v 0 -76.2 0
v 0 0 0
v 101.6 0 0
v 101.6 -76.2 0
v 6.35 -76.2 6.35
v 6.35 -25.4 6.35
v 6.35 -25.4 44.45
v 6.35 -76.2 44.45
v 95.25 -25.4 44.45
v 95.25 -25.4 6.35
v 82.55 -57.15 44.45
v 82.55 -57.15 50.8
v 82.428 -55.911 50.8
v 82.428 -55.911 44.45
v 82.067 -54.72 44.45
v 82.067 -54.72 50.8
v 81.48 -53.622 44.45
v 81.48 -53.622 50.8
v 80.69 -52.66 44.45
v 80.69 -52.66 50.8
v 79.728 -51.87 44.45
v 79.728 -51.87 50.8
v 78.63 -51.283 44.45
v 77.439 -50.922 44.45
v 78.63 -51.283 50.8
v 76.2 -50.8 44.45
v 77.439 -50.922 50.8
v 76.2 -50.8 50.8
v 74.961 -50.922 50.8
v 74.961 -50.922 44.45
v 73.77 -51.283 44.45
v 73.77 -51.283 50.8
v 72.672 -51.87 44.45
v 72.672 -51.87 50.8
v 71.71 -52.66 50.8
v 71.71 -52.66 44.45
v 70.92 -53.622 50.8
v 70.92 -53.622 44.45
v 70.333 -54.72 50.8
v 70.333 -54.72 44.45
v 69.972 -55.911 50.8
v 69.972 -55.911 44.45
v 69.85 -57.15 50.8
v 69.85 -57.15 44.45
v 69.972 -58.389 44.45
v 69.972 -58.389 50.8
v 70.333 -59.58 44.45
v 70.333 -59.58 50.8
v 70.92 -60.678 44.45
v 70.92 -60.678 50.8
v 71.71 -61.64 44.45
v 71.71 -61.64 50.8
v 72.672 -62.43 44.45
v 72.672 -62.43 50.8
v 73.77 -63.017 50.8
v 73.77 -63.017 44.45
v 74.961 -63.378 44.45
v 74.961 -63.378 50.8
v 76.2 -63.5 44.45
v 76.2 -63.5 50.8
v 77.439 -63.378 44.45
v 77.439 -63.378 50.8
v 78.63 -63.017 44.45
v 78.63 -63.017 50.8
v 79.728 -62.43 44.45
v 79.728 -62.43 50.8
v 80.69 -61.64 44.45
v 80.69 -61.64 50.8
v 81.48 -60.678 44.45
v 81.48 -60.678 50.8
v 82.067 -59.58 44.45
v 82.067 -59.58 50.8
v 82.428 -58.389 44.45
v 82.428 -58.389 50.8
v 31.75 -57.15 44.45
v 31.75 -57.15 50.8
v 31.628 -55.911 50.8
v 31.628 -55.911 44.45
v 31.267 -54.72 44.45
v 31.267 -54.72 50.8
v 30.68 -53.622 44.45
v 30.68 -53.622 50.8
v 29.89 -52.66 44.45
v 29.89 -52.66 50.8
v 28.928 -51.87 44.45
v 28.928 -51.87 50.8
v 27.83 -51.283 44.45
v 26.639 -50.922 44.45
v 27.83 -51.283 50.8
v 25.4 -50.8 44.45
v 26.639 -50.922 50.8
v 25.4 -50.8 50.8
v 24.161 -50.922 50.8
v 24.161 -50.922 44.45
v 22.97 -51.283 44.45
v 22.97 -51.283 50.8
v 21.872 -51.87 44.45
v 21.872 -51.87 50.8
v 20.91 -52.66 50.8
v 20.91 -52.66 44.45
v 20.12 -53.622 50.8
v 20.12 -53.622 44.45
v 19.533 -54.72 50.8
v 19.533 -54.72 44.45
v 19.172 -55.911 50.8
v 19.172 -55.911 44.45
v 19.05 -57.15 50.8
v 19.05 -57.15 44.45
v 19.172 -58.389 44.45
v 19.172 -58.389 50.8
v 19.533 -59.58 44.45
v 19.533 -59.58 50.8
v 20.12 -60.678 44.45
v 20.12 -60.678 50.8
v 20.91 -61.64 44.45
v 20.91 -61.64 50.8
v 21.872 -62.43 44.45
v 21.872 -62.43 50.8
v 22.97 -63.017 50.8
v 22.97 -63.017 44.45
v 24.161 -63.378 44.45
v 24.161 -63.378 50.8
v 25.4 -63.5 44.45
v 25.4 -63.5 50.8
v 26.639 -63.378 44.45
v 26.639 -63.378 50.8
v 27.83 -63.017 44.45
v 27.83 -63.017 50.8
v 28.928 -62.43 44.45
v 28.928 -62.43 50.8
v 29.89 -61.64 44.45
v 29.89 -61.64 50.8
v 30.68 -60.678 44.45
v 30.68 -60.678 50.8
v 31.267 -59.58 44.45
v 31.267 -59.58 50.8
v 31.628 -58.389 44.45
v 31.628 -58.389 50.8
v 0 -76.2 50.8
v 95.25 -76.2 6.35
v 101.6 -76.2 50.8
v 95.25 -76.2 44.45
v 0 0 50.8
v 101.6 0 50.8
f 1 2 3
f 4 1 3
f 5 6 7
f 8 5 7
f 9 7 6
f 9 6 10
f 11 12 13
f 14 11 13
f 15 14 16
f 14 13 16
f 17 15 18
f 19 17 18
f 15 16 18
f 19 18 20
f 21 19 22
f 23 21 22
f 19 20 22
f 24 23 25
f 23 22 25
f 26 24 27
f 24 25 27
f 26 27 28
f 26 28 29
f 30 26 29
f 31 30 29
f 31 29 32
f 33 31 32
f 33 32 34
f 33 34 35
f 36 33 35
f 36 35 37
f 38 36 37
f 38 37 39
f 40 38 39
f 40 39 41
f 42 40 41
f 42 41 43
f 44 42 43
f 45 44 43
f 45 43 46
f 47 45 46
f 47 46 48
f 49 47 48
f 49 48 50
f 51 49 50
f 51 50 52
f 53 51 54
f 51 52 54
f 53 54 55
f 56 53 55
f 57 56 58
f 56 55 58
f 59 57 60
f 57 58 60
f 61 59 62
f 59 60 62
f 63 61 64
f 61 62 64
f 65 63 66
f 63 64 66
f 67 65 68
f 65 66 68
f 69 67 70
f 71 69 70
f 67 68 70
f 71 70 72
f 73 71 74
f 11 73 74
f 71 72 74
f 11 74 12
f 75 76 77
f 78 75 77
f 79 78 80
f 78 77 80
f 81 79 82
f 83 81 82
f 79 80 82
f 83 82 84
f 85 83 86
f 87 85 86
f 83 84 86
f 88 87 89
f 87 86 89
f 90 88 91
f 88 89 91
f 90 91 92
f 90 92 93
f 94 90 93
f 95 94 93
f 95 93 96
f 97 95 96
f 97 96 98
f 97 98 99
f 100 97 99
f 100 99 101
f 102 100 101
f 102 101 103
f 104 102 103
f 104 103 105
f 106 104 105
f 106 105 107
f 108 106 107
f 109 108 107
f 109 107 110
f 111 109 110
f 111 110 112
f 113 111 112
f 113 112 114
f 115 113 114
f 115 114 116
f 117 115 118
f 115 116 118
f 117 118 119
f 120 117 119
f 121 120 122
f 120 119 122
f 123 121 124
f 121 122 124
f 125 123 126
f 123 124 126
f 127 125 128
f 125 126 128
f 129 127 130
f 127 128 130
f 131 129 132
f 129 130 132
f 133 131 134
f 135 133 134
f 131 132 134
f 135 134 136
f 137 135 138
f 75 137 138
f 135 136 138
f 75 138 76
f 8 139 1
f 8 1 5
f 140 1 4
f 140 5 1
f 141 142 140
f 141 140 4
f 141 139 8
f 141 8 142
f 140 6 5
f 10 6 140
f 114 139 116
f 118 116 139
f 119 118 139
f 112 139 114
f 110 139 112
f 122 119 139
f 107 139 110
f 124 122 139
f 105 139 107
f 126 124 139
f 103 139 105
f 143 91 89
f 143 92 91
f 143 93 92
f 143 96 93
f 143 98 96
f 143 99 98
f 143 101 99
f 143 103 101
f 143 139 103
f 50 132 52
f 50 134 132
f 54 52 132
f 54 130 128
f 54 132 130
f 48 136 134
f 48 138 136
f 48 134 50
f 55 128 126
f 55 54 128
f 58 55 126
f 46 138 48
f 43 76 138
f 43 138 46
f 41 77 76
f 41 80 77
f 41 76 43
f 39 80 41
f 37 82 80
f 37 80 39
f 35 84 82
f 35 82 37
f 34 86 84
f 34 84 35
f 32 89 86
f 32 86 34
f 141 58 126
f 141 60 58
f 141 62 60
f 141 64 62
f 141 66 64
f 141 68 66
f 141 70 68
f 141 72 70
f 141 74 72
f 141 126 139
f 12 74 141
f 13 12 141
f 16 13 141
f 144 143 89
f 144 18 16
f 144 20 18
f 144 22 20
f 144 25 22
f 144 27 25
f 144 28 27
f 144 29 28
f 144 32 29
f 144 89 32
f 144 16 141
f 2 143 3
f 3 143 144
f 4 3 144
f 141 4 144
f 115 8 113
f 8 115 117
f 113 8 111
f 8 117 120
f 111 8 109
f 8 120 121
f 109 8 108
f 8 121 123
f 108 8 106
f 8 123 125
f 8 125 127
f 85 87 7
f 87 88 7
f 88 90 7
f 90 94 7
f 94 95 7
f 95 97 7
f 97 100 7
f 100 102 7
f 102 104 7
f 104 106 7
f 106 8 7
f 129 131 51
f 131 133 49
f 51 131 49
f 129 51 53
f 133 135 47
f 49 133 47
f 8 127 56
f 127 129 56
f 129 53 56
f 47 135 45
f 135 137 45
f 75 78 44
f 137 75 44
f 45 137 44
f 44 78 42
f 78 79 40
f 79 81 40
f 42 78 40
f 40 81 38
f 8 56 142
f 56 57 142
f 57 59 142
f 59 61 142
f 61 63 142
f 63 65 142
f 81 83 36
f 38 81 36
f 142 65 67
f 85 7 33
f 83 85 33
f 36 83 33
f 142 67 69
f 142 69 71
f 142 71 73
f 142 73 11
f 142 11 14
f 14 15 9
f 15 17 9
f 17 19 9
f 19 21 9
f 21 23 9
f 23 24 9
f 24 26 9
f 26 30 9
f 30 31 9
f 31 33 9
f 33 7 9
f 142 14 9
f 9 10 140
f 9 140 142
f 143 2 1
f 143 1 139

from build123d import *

# Parameters (mm, degrees)
F0_W     = 101.6
F0_H     = 50.8
F0_W_2   = 88.9
F0_H_2   = 38.1
F1_DEPTH = 76.2
F2_W     = 88.9
F2_H     = 38.1
F3_DEPTH = 25.4
F4_R     = 6.35
F5_DEPTH = 25.4


with BuildPart() as f1:
    # F0 (on Front) → F1 (new body)
    with BuildSketch(Plane.XZ):
        with Locations((50.8, 25.4)):
            Rectangle(F0_W, F0_H)
        with Locations((50.8, 25.4)):
            Rectangle(F0_W_2, F0_H_2, mode=Mode.SUBTRACT)
    extrude(amount=F1_DEPTH)

    # F2 (on Front) → F3 (join)
    with BuildSketch(Plane.XZ):
        with Locations((50.8, 25.4)):
            Rectangle(F2_W, F2_H)
    extrude(amount=F3_DEPTH)

    # F4 (on face) → F5 (cut)
    with BuildSketch(Plane.XY.offset(50.8)):
        with Locations((25.4, -57.15)):
            Circle(F4_R)
        with Locations((76.2, -57.15)):
            Circle(F4_R)
    extrude(amount=-F5_DEPTH, mode=Mode.SUBTRACT)


solid = f1.part
